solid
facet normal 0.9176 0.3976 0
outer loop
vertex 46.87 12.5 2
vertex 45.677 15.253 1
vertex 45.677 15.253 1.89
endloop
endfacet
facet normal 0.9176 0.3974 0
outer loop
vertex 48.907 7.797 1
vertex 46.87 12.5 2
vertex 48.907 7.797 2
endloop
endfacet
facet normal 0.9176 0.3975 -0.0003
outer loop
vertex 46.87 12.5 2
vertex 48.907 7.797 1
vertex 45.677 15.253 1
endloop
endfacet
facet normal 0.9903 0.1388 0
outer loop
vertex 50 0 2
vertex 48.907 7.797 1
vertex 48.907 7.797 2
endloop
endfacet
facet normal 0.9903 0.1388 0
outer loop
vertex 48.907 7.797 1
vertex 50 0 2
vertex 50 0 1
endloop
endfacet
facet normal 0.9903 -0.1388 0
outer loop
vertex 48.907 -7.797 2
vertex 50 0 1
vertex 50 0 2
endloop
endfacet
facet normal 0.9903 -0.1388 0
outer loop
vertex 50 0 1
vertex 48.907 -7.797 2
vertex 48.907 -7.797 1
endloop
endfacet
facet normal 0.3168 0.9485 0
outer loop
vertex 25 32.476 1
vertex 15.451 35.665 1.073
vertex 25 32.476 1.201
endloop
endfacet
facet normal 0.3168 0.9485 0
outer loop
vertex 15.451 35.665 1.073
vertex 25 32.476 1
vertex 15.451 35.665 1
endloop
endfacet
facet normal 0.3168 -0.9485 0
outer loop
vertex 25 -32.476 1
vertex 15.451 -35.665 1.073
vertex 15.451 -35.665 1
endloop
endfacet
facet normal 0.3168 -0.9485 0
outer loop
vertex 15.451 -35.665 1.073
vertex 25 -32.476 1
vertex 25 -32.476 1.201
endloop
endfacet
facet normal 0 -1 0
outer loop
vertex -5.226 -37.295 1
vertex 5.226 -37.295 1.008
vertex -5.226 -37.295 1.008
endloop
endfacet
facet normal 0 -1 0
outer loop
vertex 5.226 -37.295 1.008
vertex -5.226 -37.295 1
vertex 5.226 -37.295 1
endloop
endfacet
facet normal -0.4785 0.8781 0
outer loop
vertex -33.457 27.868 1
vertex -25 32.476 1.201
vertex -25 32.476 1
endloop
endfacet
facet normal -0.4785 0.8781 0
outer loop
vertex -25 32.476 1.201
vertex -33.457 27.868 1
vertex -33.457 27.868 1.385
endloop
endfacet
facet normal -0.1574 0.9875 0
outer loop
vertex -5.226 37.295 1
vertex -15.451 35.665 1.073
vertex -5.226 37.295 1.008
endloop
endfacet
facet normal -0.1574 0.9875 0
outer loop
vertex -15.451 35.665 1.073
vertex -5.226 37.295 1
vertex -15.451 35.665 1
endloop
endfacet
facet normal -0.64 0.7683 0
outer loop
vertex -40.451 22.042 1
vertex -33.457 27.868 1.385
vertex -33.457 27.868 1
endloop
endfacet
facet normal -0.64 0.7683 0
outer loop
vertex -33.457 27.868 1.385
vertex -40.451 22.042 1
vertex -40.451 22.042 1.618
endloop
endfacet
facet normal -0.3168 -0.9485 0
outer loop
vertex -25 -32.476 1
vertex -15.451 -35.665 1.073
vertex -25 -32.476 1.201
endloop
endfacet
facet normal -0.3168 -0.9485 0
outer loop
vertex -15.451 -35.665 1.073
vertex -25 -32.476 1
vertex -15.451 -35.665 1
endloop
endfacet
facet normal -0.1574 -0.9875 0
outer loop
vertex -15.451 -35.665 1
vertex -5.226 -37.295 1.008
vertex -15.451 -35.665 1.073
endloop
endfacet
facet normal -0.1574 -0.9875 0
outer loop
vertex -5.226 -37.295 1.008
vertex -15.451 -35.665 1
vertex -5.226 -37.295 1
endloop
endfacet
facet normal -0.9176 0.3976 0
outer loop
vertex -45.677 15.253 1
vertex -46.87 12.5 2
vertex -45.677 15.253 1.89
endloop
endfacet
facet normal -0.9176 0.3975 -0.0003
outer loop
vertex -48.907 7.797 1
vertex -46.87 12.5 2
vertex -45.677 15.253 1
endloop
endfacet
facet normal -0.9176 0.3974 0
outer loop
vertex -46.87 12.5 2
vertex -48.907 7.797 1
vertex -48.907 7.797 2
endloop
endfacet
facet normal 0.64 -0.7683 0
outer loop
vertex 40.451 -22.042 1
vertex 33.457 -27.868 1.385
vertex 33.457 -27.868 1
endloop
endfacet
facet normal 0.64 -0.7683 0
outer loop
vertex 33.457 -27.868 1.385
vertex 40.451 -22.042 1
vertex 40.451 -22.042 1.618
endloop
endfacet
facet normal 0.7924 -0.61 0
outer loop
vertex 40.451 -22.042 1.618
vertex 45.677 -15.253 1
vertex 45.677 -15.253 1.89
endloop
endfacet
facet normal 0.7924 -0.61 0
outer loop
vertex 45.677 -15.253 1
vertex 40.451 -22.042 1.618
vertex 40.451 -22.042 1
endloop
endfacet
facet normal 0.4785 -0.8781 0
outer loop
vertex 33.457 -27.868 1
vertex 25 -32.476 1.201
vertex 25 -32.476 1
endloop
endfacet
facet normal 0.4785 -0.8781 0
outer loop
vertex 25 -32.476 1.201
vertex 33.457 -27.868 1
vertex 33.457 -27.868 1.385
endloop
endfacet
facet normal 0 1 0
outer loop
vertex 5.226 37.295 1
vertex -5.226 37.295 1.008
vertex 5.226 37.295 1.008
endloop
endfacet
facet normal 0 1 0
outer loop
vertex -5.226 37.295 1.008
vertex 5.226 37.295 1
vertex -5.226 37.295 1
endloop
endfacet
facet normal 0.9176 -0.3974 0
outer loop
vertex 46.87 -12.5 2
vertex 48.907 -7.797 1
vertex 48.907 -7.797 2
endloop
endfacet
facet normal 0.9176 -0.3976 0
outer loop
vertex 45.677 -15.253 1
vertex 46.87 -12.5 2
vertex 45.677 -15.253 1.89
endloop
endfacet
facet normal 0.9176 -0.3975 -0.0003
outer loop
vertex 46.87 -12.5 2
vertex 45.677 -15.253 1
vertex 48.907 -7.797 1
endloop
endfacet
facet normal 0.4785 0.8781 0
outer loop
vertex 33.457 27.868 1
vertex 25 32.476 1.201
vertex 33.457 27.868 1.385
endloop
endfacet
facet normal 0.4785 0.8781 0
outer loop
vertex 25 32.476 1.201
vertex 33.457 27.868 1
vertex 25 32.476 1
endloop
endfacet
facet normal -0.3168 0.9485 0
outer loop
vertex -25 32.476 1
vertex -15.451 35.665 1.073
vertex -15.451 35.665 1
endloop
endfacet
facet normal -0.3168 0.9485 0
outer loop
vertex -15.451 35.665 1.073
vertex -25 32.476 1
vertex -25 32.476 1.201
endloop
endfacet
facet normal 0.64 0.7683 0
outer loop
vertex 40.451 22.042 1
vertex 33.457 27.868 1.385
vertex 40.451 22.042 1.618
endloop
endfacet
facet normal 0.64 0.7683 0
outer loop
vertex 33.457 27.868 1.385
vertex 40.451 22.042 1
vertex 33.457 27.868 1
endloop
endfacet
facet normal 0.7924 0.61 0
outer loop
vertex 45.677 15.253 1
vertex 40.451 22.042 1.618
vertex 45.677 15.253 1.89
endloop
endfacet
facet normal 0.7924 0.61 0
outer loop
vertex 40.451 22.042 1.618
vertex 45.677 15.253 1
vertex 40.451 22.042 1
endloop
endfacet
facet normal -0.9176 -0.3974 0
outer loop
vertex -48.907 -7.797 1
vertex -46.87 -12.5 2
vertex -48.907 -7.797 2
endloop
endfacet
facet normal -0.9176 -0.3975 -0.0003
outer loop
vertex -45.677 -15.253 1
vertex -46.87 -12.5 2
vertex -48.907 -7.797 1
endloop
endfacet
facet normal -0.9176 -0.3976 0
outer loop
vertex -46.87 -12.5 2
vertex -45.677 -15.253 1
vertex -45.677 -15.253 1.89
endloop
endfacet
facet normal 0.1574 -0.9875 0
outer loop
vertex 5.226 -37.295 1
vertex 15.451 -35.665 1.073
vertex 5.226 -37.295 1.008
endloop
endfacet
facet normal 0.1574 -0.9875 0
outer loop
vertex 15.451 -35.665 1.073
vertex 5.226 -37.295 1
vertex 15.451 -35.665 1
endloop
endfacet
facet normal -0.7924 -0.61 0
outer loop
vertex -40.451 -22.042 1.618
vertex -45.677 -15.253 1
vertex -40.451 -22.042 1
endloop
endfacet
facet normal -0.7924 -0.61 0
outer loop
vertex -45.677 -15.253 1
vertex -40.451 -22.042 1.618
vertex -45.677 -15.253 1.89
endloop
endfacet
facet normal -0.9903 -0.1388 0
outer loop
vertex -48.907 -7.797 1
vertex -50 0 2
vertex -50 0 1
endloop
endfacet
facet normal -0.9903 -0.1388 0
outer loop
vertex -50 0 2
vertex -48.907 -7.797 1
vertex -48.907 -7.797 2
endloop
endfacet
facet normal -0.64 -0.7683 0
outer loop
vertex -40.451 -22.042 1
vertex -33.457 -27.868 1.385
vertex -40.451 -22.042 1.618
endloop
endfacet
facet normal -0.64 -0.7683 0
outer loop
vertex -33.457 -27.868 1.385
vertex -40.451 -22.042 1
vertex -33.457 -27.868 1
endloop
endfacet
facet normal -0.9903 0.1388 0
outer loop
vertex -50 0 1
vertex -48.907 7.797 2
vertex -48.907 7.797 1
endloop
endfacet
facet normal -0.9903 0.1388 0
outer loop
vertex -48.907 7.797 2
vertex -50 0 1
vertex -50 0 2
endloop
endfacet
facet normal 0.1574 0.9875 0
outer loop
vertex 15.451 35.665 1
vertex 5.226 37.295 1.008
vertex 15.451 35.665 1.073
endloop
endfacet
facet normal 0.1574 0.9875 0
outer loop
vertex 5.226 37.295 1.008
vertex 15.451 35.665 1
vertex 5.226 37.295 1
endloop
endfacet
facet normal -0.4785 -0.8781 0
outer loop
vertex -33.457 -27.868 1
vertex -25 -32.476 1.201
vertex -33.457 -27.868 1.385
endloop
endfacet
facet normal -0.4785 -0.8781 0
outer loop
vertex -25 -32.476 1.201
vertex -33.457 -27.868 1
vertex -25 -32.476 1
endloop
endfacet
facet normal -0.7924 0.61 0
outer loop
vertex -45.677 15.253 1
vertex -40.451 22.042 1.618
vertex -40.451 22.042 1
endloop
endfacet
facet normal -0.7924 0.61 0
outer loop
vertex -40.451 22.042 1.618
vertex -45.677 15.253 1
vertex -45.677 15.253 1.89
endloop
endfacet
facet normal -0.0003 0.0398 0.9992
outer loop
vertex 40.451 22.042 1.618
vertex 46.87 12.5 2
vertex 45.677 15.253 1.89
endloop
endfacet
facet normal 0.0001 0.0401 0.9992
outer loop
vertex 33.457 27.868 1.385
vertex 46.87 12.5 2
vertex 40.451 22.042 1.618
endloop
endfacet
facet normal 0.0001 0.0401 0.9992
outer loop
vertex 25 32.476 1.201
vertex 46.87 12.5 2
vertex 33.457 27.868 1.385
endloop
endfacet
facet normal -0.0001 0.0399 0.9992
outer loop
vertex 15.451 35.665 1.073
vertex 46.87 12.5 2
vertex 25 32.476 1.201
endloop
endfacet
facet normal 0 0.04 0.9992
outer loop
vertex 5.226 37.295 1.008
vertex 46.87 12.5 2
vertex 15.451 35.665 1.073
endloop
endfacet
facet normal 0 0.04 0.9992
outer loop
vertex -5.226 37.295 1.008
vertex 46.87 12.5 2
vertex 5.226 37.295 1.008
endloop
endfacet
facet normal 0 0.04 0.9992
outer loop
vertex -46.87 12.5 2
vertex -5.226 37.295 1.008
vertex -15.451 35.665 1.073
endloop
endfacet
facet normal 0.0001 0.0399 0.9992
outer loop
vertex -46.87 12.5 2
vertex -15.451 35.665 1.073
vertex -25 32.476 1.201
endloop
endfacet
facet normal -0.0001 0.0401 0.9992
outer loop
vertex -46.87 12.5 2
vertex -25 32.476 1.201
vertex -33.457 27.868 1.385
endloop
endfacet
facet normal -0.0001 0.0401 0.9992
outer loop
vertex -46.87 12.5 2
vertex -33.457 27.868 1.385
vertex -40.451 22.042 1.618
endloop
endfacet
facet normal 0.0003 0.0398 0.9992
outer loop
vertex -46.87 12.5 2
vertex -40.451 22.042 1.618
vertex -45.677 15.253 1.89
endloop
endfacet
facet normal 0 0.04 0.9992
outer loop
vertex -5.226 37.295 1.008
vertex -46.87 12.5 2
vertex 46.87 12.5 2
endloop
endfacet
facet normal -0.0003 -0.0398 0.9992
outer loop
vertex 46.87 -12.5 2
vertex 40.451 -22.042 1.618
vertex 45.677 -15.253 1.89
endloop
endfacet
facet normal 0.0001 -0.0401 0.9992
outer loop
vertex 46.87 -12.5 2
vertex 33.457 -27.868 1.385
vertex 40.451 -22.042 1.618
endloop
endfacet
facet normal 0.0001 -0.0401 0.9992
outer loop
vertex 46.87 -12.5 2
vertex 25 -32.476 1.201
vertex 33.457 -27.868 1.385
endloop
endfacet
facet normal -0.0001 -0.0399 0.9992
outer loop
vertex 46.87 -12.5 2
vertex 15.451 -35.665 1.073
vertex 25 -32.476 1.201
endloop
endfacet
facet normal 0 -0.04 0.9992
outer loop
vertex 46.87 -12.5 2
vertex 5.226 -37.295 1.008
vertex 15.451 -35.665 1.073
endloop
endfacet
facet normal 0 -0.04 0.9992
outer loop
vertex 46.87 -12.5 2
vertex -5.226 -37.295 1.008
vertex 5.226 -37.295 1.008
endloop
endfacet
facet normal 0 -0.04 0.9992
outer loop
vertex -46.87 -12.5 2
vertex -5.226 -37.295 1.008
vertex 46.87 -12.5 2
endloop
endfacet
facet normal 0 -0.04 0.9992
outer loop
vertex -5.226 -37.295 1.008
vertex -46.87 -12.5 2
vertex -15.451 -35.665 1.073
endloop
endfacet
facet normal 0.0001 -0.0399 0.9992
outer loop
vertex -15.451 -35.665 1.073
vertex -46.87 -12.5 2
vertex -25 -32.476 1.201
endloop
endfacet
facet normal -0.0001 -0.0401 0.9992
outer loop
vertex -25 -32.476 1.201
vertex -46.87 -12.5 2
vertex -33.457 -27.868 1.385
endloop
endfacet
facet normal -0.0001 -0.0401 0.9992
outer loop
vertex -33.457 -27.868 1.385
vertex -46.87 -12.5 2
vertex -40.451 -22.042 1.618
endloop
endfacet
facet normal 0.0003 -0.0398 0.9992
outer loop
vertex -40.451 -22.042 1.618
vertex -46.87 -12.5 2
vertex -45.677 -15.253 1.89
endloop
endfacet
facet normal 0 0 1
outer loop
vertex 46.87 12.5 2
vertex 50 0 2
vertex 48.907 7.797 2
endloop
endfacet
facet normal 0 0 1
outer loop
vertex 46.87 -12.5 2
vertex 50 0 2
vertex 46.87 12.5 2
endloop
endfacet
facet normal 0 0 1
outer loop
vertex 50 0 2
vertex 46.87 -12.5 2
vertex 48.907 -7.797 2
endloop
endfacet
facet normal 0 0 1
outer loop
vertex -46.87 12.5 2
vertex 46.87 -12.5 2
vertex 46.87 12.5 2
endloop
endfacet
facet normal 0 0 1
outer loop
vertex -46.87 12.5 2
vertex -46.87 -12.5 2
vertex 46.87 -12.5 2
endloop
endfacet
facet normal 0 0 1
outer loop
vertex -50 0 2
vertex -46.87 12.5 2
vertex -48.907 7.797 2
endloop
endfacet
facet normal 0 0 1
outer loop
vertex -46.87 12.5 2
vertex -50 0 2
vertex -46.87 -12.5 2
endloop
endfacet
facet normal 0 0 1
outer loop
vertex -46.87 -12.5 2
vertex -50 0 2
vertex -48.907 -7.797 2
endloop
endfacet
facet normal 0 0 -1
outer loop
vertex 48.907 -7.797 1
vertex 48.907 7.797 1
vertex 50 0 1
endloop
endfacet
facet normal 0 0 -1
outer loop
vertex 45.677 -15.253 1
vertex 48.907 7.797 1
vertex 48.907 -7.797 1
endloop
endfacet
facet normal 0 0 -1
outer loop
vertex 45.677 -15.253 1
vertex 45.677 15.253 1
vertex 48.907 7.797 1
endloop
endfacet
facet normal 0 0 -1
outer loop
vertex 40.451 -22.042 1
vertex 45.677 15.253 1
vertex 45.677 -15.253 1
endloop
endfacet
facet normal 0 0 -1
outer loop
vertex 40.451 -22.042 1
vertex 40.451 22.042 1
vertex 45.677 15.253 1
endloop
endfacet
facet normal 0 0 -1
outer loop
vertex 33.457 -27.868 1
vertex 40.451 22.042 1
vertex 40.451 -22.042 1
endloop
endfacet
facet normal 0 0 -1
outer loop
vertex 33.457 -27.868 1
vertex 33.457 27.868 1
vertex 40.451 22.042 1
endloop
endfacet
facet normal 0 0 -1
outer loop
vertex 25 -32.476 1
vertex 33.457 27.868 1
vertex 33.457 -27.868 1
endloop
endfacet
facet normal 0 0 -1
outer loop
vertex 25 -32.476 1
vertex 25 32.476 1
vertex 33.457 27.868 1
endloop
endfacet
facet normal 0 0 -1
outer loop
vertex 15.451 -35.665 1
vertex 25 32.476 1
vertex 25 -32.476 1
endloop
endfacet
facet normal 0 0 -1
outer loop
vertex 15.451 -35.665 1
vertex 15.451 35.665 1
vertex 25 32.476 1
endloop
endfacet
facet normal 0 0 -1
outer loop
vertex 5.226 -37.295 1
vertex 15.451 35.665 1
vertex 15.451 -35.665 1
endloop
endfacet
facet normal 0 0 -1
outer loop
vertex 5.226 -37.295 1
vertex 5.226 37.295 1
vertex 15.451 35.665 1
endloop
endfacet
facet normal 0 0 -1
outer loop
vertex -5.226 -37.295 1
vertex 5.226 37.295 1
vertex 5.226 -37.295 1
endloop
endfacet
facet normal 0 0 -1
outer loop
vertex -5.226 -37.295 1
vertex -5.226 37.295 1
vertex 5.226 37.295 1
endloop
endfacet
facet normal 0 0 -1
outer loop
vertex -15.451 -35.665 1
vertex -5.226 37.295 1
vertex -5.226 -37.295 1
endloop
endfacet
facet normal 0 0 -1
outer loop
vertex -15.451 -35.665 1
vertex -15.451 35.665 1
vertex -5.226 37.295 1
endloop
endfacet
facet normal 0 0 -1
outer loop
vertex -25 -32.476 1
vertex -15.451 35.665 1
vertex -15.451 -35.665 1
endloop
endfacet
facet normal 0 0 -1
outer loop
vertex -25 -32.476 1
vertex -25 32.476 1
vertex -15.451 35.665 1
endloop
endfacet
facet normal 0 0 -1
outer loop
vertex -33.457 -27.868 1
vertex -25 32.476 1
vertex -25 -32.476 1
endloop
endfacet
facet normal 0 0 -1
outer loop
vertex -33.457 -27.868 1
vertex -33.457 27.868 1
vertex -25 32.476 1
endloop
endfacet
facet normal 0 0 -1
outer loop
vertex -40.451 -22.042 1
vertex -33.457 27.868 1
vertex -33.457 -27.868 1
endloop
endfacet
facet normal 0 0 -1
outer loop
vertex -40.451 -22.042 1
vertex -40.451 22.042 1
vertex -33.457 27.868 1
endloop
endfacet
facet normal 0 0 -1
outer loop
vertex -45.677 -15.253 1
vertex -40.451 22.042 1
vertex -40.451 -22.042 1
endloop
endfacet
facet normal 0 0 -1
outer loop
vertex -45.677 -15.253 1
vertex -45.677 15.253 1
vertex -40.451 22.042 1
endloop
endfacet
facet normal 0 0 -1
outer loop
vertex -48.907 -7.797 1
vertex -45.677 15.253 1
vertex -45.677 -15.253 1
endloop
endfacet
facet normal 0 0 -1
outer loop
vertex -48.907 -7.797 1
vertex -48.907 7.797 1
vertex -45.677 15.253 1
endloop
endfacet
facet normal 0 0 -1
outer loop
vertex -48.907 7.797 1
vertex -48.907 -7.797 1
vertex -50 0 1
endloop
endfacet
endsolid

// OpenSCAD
length = 100;
width = 75;
thickness = 2;
slots = 8;

scale([length/width,1,1]) 
intersection() {
    cylinder(h=thickness*2, d=width);
rotate([90,0,90]) linear_extrude(height=width, center=true) polygon([[-width/2,thickness/2],[-width/6,thickness],[width/6,thickness],[width/2,thickness/2]]);
   }
